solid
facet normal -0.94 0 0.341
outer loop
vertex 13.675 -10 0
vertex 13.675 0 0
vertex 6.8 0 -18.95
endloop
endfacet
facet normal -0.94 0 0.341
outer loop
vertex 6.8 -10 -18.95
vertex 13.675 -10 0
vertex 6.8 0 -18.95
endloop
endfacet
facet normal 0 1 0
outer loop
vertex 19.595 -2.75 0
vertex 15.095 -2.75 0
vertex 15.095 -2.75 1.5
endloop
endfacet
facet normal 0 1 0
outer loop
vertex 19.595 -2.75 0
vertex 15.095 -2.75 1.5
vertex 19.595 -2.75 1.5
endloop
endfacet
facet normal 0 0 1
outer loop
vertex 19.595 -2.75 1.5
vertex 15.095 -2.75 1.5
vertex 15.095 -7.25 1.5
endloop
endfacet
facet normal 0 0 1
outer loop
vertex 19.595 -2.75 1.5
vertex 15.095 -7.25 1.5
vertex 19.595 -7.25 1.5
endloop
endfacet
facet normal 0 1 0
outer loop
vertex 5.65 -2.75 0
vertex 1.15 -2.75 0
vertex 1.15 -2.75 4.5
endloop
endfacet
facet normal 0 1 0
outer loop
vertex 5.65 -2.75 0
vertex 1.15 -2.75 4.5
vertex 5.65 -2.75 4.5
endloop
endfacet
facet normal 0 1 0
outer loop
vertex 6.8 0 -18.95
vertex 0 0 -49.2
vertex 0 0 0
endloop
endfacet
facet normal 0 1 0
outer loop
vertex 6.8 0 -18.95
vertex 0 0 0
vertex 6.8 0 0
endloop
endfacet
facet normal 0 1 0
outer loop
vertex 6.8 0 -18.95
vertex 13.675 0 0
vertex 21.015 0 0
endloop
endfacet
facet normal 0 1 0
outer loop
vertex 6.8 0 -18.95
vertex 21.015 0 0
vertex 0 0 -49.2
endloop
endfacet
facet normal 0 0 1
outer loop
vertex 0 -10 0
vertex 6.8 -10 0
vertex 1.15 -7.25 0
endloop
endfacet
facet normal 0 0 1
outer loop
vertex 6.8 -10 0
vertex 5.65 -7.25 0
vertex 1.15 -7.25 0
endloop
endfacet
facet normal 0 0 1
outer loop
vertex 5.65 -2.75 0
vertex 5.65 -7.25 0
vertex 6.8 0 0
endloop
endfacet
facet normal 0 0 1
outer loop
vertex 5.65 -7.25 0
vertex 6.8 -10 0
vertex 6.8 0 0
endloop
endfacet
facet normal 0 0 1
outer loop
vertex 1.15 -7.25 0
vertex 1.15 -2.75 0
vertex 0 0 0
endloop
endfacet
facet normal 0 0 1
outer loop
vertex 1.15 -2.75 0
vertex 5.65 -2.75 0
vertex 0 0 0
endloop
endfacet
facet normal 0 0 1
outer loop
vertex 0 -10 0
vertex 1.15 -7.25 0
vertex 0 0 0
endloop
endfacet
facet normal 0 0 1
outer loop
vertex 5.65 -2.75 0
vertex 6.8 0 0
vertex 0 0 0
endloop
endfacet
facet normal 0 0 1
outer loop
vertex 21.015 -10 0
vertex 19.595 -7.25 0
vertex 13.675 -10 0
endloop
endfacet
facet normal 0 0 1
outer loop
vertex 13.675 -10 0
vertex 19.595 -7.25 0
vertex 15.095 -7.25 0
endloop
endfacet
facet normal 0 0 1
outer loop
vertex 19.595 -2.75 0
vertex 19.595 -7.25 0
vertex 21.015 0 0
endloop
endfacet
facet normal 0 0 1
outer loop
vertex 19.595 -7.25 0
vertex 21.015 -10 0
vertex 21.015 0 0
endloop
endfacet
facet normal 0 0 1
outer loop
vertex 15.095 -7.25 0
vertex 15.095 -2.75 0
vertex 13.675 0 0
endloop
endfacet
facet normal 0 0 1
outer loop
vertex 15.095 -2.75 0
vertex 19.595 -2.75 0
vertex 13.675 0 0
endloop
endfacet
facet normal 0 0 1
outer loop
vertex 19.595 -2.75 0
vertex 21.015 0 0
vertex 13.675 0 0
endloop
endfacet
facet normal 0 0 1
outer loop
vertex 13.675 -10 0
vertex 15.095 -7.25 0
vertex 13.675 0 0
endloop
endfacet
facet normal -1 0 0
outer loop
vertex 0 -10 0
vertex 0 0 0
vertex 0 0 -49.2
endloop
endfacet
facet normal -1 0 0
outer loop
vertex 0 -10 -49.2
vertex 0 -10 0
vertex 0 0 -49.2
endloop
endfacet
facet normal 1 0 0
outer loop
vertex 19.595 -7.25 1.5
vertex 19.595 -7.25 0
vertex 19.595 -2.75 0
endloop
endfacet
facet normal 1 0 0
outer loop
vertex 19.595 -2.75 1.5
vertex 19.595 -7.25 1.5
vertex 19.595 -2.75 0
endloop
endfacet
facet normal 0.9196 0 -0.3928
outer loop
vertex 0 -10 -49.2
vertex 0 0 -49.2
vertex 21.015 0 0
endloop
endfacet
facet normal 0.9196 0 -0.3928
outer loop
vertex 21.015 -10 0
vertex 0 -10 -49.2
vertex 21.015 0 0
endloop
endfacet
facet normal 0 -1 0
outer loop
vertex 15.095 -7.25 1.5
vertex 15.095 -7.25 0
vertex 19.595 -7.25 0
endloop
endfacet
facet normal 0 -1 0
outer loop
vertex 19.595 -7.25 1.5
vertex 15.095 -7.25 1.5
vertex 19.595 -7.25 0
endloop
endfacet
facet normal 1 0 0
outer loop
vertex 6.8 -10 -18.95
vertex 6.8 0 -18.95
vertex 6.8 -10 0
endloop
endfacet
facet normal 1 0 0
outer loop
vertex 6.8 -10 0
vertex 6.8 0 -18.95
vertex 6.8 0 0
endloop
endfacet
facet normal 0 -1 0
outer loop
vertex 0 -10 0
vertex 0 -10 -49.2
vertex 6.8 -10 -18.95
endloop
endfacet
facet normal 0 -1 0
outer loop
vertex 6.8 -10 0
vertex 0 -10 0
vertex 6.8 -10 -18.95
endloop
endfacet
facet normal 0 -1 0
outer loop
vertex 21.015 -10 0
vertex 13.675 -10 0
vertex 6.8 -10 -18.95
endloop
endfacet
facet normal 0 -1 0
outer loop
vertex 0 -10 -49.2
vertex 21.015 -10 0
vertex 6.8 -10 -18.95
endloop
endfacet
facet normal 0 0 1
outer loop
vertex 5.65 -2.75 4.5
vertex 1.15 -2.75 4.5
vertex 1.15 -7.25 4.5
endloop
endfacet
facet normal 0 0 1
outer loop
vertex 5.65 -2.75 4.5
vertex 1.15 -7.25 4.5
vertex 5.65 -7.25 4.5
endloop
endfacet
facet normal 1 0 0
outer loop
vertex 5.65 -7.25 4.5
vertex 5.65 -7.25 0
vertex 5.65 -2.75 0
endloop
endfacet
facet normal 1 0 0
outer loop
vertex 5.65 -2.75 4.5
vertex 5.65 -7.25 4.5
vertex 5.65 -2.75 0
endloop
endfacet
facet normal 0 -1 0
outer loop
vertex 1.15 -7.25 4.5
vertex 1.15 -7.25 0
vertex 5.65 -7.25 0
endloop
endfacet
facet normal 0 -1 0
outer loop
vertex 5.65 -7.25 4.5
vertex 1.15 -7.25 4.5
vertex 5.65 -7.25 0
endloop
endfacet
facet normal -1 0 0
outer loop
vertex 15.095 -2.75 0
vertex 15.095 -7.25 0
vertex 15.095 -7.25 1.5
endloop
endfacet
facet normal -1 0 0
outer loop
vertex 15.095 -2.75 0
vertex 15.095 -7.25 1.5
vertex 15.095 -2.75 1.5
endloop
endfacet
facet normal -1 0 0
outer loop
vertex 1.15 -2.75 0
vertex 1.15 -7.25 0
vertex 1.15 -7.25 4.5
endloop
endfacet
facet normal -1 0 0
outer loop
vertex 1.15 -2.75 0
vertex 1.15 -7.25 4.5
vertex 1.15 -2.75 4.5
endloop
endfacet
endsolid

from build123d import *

# Parameters (mm, degrees)
F1_DEPTH = 10
F2_W     = 4.5
F2_H     = 4.5
F3_DEPTH = 4.5
F4_W     = 4.5
F4_H     = 4.5
F5_DEPTH = 1.5


with BuildPart() as f1:
    # F0 (on Front) → F1 (new body)
    with BuildSketch(Plane.XZ):
        Polygon((6.8, 0), (0, 0), (0, -49.2), (21.014519, 0), (13.674519, 0), (6.8, -18.95), align=None)
    extrude(amount=F1_DEPTH)

    # F2 (on face) → F3 (join)
    with BuildSketch(Plane.XY):
        with Locations((3.4, -5)):
            Rectangle(F2_W, F2_H)
    extrude(amount=F3_DEPTH)

    # F4 (on face) → F5 (join)
    with BuildSketch(Plane.XY):
        with Locations((17.344519, -5)):
            Rectangle(F4_W, F4_H)
    extrude(amount=F5_DEPTH)


solid = f1.part
